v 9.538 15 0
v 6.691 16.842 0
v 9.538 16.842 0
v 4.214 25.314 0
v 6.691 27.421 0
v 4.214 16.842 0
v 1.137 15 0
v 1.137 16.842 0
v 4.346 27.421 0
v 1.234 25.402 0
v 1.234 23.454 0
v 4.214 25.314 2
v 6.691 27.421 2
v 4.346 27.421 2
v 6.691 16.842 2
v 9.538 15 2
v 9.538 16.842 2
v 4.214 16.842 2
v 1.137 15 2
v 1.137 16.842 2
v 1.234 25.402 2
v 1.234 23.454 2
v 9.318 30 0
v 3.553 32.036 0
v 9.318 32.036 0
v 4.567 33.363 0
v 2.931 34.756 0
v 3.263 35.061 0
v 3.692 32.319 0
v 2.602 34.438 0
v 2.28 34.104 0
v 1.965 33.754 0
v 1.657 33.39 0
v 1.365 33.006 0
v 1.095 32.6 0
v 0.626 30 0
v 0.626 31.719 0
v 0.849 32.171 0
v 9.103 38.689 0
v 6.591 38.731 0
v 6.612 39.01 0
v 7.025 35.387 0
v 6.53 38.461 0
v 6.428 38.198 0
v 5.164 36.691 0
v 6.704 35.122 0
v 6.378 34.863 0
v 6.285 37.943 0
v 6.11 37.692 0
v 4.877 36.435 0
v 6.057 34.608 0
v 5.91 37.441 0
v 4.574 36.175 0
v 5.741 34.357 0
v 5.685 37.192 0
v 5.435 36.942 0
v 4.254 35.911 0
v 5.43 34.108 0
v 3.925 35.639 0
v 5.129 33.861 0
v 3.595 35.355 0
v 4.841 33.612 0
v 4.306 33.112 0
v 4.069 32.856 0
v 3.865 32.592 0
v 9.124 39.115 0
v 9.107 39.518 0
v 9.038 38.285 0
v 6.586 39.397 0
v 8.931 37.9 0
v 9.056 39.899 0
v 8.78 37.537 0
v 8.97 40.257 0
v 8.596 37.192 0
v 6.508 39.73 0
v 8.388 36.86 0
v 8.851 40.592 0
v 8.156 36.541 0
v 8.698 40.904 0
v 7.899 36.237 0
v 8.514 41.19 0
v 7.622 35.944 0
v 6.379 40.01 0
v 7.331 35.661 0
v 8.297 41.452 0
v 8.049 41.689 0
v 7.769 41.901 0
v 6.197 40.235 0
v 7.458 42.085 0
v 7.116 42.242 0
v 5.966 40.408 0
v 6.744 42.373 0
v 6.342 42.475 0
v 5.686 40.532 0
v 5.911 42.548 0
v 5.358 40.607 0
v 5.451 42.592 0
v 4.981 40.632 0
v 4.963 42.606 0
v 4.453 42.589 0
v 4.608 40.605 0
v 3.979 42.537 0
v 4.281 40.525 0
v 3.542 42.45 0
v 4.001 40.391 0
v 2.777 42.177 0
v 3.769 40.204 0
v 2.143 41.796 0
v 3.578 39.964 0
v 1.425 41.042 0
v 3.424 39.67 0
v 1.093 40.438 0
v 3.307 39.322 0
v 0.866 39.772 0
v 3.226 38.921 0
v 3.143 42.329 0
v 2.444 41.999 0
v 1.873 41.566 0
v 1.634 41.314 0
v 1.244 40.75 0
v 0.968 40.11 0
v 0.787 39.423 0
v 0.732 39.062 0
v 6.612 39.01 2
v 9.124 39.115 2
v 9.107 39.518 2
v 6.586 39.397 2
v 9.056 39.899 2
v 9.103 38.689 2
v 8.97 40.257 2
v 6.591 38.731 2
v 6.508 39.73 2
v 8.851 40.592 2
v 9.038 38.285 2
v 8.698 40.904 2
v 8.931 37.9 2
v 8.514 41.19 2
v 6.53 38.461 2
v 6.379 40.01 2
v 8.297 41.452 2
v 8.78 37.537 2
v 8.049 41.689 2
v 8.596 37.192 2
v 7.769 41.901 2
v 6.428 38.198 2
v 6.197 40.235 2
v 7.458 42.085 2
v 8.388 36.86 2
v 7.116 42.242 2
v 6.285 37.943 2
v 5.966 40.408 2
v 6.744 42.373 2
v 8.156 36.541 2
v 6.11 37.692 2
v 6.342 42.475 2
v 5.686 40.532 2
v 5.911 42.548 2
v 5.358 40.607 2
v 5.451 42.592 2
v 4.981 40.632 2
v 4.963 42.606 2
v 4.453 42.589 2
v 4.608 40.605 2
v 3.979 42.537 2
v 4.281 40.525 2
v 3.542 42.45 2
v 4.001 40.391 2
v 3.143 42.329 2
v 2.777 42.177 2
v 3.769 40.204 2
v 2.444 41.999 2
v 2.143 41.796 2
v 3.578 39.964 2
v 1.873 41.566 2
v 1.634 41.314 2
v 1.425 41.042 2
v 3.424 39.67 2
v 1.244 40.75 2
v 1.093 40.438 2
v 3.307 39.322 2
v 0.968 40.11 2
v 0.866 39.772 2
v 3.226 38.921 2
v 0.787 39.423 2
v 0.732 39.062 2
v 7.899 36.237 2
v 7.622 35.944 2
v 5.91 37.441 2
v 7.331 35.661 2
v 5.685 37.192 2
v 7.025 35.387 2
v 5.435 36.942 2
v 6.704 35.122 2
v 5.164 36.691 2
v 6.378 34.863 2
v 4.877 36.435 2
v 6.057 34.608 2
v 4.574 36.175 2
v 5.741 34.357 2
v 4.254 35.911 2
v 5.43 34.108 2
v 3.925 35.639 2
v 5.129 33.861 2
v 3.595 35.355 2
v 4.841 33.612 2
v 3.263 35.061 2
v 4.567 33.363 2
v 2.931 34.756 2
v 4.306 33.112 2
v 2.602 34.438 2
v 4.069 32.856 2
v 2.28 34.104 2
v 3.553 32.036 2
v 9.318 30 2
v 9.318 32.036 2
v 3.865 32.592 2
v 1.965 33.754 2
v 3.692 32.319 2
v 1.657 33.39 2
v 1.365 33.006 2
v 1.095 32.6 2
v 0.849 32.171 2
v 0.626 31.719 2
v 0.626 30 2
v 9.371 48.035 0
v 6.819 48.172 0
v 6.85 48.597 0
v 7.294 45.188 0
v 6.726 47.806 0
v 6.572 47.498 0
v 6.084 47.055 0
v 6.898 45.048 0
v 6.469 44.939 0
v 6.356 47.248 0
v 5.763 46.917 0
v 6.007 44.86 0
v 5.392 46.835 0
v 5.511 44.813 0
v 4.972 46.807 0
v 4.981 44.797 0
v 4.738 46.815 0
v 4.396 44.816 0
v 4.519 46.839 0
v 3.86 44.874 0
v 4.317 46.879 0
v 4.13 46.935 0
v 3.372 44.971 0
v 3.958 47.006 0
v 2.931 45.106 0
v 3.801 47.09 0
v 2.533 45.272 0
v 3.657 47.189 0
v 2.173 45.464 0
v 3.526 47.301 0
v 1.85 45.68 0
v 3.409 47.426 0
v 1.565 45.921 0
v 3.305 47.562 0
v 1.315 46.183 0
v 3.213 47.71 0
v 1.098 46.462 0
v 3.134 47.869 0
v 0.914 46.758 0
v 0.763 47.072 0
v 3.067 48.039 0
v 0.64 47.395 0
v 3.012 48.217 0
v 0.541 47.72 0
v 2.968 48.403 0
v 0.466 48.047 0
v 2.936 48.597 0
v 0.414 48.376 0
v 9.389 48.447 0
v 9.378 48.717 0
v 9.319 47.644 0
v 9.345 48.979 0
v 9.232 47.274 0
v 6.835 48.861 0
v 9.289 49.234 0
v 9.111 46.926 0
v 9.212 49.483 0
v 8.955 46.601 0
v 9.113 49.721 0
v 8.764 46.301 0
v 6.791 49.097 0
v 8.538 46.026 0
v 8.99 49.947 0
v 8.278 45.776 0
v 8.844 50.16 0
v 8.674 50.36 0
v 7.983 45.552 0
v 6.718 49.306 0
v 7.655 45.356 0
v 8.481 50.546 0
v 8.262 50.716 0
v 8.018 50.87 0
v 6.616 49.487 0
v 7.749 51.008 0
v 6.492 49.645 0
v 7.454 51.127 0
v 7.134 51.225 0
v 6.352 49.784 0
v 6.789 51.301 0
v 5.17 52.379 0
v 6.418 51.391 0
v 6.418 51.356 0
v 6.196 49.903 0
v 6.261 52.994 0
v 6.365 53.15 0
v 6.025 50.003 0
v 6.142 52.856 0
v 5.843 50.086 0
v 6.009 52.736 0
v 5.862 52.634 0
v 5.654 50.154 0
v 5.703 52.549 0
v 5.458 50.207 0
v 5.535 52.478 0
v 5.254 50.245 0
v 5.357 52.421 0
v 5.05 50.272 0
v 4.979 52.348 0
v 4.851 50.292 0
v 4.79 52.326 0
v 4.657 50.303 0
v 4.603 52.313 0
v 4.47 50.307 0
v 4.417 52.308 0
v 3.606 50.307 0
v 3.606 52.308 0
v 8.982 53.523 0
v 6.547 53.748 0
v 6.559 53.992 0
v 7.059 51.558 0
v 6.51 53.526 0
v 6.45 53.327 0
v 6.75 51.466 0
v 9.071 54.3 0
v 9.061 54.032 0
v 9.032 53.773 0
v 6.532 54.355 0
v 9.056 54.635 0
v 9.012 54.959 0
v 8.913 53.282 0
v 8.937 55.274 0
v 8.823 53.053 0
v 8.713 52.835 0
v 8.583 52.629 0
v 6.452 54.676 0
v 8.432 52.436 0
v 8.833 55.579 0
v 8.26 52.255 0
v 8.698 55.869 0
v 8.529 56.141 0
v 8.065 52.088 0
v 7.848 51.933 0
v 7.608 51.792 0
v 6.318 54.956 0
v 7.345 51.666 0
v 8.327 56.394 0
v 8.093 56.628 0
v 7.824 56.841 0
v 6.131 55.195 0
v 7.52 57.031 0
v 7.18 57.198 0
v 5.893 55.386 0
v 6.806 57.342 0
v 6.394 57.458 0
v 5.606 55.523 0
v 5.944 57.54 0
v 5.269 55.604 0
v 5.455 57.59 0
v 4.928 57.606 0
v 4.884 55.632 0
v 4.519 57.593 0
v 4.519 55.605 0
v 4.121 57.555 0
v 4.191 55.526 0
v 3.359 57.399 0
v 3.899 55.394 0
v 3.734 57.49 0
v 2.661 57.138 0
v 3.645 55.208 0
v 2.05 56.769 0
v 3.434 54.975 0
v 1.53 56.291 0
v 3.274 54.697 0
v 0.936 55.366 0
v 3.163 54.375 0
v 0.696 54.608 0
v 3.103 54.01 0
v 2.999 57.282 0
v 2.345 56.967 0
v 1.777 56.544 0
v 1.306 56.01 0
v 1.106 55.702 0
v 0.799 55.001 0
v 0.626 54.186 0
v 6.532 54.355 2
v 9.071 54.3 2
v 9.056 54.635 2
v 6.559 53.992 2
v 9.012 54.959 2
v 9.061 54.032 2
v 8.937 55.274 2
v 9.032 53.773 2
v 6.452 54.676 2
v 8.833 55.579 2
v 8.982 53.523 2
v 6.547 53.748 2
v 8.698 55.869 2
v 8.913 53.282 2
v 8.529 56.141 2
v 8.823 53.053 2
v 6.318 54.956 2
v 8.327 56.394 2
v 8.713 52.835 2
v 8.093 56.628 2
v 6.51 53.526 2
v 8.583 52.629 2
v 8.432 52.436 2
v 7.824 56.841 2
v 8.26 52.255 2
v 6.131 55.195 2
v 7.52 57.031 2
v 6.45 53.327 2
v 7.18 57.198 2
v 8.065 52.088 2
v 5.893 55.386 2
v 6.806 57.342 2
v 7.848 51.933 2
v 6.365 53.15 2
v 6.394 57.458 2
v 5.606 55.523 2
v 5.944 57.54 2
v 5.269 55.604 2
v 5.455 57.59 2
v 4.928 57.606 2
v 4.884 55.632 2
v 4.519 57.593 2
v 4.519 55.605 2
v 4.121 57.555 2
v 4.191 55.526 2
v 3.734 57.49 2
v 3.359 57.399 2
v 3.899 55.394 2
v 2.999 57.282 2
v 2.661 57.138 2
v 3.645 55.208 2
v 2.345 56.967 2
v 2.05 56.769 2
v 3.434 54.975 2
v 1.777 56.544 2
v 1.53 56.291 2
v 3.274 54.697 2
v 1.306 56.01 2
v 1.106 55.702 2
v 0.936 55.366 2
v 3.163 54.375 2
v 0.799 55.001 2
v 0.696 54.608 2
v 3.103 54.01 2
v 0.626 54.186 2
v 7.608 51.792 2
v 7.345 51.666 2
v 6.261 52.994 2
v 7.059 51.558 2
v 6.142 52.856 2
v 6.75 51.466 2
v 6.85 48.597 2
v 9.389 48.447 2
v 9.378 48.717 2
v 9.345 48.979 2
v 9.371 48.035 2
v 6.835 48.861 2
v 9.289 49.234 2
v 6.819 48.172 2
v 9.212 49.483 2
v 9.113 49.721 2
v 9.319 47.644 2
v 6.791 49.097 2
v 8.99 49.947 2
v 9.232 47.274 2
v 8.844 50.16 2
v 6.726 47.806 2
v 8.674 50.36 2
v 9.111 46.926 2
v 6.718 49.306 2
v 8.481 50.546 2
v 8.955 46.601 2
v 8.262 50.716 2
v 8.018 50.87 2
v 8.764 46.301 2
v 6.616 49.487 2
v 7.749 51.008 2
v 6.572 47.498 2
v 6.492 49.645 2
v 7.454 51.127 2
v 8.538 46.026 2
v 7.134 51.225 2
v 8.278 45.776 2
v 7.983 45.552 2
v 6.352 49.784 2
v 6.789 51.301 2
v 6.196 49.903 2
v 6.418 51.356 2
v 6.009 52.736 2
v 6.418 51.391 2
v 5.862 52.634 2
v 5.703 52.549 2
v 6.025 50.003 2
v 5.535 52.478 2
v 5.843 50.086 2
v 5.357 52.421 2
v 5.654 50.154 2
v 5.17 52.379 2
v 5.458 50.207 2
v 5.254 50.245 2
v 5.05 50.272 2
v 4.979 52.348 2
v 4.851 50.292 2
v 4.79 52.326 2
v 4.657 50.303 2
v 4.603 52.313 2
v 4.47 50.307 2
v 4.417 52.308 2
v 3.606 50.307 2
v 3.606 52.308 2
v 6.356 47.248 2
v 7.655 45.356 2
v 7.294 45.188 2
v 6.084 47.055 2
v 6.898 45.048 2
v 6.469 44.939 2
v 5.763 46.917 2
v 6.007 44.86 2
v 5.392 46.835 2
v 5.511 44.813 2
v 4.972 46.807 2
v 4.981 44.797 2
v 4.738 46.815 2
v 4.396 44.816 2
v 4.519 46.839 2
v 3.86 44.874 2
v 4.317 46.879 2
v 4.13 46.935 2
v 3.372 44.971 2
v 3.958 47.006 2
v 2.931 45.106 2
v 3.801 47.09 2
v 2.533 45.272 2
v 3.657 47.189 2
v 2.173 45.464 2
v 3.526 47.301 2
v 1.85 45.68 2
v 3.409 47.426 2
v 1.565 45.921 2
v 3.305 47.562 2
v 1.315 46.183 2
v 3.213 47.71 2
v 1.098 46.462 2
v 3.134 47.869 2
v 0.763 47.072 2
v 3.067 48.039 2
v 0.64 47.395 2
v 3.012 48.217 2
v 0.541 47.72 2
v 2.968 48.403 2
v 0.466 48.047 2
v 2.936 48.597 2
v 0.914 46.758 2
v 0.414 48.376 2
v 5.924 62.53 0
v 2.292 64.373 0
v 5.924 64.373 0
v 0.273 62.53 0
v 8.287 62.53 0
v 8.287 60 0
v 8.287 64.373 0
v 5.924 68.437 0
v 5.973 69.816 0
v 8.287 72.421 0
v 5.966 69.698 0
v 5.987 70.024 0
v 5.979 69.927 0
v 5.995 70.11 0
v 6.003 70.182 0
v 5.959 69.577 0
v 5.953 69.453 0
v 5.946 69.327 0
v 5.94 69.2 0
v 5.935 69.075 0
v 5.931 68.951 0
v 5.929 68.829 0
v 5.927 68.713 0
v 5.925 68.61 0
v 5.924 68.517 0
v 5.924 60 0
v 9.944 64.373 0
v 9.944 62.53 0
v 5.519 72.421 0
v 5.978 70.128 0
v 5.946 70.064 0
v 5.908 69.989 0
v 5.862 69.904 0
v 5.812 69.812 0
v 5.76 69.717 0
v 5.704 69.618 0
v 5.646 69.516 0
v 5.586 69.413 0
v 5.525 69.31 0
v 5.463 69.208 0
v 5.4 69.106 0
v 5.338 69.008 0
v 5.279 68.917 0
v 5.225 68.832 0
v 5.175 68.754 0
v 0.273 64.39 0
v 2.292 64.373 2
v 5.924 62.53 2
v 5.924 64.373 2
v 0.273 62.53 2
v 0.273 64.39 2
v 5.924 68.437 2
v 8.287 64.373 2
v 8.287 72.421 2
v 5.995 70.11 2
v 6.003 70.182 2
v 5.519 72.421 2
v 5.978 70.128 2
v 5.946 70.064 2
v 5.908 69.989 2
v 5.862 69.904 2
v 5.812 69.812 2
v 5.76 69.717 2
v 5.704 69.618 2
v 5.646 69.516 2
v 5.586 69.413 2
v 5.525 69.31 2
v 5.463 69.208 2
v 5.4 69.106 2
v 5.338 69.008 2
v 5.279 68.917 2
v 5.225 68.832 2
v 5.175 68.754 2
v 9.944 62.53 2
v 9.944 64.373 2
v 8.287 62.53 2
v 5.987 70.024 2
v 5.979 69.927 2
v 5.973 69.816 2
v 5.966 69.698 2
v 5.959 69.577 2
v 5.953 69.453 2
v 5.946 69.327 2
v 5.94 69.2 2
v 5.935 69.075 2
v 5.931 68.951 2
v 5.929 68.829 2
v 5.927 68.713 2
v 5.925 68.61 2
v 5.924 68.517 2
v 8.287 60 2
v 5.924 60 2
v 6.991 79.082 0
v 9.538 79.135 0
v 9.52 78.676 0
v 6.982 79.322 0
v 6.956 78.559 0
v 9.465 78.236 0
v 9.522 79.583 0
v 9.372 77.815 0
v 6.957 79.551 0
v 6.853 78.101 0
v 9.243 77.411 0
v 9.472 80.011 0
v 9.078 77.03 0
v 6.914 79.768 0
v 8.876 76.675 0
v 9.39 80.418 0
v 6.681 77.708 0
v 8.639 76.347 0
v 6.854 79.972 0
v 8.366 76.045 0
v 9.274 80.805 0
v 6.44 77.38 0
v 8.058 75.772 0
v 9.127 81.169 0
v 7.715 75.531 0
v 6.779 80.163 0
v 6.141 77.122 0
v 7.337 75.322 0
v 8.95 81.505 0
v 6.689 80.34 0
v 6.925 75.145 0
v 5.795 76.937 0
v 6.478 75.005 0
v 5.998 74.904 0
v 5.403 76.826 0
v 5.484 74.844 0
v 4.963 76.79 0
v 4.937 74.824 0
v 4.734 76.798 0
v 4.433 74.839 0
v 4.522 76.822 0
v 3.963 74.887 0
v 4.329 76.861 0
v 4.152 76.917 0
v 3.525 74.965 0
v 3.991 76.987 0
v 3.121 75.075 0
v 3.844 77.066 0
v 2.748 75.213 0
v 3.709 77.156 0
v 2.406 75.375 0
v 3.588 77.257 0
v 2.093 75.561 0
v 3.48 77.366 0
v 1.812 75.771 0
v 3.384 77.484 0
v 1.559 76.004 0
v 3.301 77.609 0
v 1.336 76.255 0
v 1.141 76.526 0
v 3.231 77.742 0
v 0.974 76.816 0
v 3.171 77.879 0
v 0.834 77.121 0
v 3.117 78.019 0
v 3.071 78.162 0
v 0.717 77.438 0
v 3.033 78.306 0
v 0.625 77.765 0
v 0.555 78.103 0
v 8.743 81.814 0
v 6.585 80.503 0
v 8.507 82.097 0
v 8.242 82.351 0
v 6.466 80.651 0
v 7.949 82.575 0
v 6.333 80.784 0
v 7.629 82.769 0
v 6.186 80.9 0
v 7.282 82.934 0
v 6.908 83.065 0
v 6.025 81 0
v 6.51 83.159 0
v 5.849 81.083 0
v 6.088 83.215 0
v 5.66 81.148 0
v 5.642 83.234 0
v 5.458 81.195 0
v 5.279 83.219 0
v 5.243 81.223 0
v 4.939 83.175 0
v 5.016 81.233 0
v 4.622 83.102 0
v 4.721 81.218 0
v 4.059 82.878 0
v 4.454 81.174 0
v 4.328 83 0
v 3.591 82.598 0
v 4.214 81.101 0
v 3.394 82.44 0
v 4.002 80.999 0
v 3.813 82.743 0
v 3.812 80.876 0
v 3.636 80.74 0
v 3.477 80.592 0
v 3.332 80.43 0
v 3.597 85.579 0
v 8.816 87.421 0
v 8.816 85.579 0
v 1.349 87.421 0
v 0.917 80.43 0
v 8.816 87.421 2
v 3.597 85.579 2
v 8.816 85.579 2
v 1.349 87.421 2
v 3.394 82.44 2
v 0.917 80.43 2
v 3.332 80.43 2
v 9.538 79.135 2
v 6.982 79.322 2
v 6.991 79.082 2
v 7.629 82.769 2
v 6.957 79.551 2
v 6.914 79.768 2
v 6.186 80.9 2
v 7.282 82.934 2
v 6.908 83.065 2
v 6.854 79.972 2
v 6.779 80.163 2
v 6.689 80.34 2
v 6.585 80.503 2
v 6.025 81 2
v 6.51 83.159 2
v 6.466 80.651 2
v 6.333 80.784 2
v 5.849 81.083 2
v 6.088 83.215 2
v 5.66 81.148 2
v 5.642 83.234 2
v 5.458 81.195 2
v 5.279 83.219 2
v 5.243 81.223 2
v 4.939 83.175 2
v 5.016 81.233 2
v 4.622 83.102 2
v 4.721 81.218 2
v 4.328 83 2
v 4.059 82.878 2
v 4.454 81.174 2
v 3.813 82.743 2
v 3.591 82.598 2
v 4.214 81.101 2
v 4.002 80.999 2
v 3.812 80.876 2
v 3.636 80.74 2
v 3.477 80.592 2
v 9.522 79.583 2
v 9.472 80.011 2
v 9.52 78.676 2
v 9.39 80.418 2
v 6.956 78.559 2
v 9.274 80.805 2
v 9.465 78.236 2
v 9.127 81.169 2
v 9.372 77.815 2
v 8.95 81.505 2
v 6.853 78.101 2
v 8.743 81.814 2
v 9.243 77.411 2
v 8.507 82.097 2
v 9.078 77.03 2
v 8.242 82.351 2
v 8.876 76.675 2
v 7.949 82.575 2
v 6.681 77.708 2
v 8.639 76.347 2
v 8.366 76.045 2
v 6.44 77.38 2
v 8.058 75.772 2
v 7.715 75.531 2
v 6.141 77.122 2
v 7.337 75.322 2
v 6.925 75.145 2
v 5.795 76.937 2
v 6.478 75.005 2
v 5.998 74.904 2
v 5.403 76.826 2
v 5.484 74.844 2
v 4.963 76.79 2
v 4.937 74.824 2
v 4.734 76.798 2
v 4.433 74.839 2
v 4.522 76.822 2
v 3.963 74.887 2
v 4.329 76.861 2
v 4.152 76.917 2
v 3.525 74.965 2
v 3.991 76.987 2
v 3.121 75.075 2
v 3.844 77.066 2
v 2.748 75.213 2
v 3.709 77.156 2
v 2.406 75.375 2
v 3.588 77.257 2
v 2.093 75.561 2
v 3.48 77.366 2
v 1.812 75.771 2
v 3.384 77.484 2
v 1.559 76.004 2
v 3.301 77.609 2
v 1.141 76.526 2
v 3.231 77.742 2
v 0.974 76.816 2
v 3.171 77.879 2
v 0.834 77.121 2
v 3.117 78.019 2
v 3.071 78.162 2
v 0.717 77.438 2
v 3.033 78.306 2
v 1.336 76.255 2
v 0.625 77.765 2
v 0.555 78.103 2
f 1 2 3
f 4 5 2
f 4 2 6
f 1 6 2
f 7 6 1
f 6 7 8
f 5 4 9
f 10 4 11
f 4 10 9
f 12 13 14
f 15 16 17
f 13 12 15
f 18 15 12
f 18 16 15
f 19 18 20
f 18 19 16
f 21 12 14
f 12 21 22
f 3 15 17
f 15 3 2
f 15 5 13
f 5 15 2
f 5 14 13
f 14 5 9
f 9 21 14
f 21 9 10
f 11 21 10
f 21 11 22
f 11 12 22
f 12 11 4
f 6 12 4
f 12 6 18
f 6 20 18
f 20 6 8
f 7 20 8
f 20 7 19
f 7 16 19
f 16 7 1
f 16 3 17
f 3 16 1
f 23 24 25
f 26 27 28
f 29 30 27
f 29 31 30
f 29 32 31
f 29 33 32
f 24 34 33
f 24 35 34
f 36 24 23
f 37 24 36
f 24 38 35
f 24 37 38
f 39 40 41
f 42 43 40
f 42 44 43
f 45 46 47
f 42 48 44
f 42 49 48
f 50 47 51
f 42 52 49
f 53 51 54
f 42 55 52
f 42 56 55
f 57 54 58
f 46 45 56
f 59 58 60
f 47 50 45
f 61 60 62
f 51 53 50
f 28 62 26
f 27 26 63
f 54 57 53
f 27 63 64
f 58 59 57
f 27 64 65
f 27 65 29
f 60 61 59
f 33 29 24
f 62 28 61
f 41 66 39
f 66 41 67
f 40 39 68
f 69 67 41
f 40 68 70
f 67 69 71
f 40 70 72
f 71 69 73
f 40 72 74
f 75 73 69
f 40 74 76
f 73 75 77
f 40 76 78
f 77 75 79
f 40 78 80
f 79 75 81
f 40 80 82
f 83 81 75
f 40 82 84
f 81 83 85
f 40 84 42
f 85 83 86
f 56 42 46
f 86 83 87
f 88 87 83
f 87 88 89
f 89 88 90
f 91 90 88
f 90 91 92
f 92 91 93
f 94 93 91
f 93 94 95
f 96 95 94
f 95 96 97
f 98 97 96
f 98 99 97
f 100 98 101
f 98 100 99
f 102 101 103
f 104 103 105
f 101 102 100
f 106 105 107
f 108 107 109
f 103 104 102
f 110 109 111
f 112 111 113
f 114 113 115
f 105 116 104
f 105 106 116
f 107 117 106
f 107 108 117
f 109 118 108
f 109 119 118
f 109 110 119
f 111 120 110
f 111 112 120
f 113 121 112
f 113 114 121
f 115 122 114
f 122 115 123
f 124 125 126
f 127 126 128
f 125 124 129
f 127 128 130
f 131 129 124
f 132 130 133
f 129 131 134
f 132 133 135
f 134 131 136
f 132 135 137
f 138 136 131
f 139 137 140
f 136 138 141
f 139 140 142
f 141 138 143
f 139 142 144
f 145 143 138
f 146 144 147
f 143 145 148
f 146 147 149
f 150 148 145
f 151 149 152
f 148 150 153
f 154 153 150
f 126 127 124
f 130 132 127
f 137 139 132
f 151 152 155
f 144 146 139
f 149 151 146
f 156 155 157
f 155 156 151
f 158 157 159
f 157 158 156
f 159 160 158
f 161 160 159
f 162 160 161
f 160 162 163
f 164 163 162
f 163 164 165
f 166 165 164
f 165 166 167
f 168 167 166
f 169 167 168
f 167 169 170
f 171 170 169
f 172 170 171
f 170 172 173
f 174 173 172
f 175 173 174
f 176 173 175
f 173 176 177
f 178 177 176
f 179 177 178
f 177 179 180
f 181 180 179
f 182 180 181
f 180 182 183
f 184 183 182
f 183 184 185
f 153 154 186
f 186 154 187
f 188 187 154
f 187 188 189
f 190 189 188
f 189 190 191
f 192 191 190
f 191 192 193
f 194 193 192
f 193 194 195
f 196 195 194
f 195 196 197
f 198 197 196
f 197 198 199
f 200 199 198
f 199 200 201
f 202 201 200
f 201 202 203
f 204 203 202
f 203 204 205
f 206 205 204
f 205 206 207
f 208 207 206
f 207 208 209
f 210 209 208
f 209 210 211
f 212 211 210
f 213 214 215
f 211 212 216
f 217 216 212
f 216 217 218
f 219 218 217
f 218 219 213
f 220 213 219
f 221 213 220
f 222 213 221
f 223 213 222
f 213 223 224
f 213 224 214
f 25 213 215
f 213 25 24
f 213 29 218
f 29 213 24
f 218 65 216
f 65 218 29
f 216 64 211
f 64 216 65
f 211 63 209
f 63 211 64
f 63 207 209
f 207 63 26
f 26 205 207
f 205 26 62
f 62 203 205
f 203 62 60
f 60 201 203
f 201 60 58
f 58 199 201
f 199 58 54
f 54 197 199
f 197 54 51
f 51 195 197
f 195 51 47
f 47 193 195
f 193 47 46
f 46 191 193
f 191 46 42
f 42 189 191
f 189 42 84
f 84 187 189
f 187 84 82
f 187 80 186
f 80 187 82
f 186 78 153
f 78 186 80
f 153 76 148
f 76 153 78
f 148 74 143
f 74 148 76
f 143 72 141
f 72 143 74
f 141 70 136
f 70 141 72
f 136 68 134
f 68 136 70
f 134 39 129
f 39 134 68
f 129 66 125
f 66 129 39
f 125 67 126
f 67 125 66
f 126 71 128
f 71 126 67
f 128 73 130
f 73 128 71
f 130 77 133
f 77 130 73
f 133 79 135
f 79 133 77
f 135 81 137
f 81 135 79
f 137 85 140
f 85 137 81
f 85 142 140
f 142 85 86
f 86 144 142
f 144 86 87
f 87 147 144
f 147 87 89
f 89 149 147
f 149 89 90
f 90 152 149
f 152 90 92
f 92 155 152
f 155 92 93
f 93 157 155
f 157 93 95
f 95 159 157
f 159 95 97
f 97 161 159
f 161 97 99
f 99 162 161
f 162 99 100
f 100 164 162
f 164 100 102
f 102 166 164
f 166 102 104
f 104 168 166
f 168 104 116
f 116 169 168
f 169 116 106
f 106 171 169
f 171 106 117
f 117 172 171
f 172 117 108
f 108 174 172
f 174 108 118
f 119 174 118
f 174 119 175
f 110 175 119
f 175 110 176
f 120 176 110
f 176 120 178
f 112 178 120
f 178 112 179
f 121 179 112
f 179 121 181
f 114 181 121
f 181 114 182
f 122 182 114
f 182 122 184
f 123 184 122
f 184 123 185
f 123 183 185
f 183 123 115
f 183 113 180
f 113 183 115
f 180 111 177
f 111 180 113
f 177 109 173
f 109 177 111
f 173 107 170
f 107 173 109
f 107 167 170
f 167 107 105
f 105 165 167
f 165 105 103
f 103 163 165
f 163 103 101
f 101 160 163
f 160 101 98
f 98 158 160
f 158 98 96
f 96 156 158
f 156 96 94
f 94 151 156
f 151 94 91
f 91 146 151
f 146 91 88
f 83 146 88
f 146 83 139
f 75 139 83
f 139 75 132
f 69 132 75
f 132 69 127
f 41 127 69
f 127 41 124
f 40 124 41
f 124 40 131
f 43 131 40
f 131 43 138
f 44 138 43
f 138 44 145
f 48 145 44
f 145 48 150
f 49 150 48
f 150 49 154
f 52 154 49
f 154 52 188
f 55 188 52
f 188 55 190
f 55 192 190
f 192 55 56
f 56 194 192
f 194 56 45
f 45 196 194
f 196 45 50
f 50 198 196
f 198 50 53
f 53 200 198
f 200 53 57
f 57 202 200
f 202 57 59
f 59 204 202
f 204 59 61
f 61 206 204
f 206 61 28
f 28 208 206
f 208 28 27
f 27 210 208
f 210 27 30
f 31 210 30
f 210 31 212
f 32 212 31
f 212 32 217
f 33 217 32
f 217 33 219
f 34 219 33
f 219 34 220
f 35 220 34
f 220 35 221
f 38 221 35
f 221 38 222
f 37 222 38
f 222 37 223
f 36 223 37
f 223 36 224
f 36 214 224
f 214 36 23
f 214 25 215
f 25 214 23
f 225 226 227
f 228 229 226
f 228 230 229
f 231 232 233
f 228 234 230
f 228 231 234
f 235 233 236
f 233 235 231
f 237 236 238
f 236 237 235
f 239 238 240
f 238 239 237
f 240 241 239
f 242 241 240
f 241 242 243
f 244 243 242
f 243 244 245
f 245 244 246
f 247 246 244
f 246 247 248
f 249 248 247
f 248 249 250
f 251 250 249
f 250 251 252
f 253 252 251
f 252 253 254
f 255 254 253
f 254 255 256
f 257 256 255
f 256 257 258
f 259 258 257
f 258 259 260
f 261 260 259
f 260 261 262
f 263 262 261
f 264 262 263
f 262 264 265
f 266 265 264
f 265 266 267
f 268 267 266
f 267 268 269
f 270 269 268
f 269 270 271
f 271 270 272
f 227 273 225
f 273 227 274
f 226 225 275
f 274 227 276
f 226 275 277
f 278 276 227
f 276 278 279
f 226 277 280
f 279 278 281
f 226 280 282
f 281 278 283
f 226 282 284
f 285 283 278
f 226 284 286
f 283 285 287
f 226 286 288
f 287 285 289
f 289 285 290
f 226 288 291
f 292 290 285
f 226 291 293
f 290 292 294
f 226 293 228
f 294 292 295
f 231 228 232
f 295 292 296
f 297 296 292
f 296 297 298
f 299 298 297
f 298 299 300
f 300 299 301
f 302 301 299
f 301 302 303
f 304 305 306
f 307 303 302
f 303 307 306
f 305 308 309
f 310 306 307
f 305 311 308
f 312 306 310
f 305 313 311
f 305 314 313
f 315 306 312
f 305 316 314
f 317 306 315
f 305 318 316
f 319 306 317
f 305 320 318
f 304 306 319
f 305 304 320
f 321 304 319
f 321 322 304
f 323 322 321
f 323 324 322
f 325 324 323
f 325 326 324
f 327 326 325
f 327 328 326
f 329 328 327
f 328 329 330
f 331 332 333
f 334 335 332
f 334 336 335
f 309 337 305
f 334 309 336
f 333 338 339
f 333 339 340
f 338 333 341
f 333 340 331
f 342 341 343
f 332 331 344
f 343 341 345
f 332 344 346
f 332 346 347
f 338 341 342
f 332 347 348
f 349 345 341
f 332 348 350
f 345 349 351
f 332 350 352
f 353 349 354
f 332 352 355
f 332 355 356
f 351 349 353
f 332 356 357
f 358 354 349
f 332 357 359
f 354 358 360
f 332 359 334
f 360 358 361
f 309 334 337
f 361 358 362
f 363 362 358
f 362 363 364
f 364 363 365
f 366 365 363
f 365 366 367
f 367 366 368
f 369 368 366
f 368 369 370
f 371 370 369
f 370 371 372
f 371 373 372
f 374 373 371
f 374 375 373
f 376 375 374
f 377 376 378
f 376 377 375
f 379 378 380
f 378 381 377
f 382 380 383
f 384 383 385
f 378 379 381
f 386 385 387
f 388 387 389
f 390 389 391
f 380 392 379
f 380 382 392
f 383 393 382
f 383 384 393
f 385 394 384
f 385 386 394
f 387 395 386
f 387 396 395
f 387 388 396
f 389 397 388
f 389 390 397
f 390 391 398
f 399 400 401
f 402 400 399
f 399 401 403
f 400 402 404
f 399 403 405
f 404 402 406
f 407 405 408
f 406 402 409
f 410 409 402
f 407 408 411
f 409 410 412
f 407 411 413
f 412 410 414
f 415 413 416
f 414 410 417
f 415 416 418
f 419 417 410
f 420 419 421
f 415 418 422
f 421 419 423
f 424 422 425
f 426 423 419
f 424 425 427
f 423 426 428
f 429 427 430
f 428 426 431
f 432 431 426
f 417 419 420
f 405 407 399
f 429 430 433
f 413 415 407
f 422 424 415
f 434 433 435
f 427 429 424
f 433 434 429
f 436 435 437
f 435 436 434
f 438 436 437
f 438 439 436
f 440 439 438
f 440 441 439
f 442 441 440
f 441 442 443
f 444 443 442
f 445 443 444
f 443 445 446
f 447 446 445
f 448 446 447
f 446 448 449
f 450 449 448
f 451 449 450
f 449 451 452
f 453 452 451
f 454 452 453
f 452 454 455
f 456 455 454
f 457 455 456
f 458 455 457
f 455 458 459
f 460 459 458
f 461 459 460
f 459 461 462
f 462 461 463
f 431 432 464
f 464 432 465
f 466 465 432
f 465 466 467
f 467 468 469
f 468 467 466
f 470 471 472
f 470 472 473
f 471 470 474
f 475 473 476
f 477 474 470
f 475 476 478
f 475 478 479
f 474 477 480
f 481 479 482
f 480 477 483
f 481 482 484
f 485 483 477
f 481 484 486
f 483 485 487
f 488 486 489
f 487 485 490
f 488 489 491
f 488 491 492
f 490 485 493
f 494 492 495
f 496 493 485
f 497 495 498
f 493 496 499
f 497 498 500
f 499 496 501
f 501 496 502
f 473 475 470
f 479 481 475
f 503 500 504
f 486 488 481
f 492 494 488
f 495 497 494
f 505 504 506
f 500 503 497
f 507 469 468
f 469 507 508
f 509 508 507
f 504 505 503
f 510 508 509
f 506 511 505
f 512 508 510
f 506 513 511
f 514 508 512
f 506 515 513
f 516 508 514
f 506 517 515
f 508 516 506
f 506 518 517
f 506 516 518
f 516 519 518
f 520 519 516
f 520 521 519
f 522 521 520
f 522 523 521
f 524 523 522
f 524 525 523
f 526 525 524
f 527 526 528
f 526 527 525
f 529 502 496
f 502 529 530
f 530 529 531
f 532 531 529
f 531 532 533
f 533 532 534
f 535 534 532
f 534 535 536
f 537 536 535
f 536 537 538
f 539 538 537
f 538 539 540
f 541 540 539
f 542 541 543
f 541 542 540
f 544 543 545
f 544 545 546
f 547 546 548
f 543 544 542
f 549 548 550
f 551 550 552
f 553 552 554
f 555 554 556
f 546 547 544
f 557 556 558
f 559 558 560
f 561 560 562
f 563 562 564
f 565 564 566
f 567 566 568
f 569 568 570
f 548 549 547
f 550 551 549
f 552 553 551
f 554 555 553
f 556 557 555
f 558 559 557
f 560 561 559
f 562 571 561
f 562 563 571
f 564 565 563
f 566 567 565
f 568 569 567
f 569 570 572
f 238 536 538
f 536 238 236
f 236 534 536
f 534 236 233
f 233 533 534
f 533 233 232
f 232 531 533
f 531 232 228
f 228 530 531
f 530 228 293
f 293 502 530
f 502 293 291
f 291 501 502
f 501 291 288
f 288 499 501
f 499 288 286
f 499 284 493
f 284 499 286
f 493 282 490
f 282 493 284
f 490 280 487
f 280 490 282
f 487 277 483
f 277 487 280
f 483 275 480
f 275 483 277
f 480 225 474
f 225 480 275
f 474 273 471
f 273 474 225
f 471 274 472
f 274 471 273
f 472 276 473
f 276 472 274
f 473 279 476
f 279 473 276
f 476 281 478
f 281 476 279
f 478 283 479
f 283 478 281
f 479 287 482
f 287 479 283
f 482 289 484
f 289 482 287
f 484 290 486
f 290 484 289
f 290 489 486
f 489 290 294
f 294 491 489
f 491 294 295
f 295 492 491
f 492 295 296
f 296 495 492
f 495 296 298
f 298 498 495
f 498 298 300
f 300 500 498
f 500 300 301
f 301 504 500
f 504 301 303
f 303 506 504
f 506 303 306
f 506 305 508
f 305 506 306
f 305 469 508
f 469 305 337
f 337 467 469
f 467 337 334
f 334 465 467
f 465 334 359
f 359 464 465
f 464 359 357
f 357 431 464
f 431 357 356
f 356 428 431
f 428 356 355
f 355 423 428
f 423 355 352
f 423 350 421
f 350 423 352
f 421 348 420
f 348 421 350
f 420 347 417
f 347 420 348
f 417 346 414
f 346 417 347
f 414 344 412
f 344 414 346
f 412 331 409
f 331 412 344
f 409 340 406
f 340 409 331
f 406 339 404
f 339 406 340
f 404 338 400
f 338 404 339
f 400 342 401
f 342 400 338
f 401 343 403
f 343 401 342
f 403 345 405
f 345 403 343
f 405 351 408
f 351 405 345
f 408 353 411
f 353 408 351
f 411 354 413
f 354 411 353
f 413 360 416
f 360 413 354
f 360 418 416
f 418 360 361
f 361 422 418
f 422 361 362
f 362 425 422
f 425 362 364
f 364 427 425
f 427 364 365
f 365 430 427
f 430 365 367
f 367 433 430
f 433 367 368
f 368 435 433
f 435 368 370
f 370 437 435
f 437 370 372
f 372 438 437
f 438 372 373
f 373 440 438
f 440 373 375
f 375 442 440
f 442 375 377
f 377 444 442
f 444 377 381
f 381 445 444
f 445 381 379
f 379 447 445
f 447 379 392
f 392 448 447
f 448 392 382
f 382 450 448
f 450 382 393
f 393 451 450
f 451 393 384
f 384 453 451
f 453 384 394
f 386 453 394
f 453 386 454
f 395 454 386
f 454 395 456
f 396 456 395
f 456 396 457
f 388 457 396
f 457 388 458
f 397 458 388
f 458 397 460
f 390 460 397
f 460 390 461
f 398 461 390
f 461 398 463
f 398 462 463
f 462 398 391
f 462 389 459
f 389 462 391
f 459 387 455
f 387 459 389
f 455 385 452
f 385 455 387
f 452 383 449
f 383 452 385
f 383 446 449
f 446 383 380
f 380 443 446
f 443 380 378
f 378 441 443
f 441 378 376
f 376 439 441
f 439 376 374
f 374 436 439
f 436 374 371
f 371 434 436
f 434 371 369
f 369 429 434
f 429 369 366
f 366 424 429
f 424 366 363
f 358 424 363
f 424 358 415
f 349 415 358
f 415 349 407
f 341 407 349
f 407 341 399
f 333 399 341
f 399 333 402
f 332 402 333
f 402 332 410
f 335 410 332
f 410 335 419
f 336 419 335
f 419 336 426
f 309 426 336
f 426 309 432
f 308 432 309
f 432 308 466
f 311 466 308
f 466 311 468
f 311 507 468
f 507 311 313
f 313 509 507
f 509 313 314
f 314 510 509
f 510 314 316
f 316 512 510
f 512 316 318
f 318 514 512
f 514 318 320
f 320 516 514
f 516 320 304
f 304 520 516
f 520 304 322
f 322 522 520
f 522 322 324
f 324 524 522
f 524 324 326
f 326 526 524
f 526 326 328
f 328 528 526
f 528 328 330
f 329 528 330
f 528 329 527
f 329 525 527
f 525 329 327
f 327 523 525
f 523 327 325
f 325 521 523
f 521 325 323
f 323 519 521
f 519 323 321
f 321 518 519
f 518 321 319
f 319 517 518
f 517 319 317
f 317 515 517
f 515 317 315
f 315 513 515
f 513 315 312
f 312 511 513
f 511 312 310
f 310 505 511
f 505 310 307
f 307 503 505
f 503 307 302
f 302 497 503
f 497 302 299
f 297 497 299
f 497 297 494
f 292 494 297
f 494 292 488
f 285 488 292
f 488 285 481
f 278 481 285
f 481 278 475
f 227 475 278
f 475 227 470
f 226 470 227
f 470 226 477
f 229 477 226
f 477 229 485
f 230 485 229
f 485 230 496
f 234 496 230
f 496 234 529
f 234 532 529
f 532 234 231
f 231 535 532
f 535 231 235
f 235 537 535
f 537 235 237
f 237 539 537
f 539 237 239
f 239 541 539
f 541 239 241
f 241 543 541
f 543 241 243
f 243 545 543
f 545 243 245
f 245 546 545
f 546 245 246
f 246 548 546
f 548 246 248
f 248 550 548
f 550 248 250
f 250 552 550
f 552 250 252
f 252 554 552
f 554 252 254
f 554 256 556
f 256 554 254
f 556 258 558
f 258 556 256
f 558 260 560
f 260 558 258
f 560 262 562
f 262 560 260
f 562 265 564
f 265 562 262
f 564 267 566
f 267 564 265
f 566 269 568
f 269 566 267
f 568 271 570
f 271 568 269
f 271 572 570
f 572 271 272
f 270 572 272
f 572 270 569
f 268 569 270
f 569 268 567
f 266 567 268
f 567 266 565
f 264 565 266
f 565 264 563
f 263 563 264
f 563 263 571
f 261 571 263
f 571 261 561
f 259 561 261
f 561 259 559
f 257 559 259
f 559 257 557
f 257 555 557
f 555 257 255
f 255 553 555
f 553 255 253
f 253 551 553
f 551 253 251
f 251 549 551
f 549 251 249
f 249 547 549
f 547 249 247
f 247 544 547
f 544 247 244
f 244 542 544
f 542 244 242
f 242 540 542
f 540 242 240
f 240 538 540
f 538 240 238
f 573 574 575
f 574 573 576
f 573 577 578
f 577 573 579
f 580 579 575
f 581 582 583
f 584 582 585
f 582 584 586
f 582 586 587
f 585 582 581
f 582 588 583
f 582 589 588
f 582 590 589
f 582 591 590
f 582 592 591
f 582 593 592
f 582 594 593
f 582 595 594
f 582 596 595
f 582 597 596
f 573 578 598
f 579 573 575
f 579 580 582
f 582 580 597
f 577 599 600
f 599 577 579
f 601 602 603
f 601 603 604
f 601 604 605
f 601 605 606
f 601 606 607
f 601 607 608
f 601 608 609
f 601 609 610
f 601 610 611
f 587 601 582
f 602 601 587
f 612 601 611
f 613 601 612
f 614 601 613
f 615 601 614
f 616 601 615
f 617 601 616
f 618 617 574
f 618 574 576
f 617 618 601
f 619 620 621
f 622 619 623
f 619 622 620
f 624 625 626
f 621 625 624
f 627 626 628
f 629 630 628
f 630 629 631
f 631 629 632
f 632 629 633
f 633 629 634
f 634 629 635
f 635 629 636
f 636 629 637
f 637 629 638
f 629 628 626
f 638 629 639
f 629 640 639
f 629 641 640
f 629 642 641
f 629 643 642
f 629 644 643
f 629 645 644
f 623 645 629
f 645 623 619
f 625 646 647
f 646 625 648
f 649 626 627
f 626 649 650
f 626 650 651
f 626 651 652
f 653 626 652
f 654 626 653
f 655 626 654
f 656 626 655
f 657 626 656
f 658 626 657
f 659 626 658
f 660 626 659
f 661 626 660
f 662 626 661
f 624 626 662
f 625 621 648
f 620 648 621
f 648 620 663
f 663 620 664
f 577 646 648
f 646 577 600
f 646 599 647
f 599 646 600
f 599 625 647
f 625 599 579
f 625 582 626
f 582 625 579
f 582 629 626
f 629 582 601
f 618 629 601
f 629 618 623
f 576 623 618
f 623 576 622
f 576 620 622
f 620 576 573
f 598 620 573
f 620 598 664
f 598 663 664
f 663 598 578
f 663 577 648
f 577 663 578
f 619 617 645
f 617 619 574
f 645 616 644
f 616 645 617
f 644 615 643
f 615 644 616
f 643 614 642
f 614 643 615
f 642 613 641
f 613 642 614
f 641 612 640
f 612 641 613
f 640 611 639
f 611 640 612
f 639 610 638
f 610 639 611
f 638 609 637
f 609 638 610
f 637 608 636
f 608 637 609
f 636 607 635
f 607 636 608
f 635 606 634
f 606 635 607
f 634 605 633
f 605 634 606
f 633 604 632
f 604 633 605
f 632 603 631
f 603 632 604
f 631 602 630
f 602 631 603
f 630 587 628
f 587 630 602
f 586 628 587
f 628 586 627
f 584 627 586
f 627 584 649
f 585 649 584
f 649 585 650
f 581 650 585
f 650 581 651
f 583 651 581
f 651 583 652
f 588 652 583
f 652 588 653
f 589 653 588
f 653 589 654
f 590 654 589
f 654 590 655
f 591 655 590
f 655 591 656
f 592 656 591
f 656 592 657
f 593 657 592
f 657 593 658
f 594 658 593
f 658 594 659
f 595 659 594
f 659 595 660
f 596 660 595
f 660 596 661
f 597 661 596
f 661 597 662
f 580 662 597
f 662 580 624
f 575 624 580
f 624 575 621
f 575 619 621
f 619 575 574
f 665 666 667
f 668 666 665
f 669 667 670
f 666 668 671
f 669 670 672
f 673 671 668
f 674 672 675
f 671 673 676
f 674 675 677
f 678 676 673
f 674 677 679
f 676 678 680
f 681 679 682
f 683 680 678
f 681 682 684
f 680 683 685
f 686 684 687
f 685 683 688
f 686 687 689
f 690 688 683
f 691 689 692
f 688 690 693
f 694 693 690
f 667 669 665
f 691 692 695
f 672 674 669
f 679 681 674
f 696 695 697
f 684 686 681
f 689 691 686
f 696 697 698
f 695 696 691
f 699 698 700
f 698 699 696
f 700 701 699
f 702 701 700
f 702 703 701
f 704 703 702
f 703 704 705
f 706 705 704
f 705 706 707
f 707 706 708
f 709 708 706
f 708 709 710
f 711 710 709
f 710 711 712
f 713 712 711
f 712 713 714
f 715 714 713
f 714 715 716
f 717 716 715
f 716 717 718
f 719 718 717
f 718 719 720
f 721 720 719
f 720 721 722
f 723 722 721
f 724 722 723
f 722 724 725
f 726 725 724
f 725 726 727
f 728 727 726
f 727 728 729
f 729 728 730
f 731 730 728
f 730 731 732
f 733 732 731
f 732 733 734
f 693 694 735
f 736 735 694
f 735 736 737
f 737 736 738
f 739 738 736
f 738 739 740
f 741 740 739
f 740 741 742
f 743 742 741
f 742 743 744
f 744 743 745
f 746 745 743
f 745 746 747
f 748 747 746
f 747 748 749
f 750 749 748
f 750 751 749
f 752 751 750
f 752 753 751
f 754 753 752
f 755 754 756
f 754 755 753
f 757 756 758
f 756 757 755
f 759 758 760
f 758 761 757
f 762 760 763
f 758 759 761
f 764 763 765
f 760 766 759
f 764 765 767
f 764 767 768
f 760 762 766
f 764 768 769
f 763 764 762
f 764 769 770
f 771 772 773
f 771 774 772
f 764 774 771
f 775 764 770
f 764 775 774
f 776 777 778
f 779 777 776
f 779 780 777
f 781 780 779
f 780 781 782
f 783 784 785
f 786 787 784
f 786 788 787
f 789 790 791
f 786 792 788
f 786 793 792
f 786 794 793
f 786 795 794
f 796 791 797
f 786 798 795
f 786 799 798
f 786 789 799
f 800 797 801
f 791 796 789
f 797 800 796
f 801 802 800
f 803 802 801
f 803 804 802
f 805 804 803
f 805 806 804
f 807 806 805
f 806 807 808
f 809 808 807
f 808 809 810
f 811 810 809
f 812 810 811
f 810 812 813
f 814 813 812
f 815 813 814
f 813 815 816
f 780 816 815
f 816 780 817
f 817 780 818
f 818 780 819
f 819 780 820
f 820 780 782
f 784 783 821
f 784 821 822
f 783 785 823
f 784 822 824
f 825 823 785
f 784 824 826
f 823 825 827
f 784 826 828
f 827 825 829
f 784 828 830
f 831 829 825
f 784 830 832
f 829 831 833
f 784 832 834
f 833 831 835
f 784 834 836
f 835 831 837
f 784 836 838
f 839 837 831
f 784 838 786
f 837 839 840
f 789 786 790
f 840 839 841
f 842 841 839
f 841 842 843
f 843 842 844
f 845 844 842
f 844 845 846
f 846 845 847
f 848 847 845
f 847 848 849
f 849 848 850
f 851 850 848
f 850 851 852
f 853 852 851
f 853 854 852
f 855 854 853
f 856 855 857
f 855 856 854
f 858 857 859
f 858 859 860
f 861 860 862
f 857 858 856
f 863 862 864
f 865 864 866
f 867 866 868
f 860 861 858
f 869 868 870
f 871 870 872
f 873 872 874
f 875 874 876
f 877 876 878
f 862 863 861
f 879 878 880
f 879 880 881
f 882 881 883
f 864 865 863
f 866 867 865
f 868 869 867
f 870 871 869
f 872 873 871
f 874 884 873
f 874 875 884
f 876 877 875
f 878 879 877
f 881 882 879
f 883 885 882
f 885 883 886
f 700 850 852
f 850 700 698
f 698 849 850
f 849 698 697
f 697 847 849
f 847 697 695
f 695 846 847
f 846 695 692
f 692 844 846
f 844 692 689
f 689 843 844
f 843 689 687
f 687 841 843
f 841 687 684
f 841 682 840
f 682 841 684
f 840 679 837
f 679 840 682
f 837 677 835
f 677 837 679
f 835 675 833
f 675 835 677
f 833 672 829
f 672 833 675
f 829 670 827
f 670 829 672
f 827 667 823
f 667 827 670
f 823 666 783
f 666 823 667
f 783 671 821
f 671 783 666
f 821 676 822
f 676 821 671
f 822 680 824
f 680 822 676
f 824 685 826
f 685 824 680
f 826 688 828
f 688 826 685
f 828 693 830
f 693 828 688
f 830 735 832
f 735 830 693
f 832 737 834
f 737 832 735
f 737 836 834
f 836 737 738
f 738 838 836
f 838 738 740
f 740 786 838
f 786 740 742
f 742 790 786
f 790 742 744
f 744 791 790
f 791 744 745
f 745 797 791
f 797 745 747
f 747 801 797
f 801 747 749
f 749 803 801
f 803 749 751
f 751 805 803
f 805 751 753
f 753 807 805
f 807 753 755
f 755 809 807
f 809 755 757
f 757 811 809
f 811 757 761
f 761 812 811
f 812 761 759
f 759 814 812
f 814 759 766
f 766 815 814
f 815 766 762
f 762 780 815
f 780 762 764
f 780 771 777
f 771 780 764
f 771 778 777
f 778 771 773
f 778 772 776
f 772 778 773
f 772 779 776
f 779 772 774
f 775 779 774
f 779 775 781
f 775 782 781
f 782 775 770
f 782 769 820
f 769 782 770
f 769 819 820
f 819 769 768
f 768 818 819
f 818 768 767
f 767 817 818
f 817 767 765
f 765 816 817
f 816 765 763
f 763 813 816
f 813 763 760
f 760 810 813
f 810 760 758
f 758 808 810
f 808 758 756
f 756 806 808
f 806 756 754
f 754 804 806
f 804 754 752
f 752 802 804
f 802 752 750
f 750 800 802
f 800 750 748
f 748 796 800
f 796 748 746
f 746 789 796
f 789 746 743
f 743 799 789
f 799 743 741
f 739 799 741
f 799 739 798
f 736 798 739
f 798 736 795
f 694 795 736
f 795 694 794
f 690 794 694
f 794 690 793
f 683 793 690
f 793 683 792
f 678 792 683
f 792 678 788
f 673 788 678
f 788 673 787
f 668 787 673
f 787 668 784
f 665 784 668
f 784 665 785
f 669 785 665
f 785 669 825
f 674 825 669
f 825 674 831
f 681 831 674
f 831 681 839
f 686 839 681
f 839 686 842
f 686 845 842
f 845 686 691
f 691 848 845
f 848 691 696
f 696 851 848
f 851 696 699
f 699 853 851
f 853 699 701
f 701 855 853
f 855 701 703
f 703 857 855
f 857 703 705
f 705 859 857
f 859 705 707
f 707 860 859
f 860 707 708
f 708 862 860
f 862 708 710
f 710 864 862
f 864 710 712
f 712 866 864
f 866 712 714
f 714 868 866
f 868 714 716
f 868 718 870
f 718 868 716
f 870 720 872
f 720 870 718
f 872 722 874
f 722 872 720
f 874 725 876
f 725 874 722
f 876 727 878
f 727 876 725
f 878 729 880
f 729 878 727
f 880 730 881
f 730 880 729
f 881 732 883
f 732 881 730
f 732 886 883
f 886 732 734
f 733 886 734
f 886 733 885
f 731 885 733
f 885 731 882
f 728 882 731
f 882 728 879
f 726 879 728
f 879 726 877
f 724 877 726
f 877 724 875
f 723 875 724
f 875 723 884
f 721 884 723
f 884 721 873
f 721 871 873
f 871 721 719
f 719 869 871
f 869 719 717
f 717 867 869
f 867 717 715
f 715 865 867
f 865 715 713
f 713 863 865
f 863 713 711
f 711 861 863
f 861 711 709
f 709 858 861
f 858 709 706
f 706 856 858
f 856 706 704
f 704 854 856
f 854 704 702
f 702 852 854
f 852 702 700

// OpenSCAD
use <utilities.scad>;

chars = ["0","1","2","3","4","5","6","7","8","9"];

for(i=[1:5]){
    translate([0,i*15,0]) linear_extrude(2) text(chars[i],13,font="Arial:style=Bold");
}
